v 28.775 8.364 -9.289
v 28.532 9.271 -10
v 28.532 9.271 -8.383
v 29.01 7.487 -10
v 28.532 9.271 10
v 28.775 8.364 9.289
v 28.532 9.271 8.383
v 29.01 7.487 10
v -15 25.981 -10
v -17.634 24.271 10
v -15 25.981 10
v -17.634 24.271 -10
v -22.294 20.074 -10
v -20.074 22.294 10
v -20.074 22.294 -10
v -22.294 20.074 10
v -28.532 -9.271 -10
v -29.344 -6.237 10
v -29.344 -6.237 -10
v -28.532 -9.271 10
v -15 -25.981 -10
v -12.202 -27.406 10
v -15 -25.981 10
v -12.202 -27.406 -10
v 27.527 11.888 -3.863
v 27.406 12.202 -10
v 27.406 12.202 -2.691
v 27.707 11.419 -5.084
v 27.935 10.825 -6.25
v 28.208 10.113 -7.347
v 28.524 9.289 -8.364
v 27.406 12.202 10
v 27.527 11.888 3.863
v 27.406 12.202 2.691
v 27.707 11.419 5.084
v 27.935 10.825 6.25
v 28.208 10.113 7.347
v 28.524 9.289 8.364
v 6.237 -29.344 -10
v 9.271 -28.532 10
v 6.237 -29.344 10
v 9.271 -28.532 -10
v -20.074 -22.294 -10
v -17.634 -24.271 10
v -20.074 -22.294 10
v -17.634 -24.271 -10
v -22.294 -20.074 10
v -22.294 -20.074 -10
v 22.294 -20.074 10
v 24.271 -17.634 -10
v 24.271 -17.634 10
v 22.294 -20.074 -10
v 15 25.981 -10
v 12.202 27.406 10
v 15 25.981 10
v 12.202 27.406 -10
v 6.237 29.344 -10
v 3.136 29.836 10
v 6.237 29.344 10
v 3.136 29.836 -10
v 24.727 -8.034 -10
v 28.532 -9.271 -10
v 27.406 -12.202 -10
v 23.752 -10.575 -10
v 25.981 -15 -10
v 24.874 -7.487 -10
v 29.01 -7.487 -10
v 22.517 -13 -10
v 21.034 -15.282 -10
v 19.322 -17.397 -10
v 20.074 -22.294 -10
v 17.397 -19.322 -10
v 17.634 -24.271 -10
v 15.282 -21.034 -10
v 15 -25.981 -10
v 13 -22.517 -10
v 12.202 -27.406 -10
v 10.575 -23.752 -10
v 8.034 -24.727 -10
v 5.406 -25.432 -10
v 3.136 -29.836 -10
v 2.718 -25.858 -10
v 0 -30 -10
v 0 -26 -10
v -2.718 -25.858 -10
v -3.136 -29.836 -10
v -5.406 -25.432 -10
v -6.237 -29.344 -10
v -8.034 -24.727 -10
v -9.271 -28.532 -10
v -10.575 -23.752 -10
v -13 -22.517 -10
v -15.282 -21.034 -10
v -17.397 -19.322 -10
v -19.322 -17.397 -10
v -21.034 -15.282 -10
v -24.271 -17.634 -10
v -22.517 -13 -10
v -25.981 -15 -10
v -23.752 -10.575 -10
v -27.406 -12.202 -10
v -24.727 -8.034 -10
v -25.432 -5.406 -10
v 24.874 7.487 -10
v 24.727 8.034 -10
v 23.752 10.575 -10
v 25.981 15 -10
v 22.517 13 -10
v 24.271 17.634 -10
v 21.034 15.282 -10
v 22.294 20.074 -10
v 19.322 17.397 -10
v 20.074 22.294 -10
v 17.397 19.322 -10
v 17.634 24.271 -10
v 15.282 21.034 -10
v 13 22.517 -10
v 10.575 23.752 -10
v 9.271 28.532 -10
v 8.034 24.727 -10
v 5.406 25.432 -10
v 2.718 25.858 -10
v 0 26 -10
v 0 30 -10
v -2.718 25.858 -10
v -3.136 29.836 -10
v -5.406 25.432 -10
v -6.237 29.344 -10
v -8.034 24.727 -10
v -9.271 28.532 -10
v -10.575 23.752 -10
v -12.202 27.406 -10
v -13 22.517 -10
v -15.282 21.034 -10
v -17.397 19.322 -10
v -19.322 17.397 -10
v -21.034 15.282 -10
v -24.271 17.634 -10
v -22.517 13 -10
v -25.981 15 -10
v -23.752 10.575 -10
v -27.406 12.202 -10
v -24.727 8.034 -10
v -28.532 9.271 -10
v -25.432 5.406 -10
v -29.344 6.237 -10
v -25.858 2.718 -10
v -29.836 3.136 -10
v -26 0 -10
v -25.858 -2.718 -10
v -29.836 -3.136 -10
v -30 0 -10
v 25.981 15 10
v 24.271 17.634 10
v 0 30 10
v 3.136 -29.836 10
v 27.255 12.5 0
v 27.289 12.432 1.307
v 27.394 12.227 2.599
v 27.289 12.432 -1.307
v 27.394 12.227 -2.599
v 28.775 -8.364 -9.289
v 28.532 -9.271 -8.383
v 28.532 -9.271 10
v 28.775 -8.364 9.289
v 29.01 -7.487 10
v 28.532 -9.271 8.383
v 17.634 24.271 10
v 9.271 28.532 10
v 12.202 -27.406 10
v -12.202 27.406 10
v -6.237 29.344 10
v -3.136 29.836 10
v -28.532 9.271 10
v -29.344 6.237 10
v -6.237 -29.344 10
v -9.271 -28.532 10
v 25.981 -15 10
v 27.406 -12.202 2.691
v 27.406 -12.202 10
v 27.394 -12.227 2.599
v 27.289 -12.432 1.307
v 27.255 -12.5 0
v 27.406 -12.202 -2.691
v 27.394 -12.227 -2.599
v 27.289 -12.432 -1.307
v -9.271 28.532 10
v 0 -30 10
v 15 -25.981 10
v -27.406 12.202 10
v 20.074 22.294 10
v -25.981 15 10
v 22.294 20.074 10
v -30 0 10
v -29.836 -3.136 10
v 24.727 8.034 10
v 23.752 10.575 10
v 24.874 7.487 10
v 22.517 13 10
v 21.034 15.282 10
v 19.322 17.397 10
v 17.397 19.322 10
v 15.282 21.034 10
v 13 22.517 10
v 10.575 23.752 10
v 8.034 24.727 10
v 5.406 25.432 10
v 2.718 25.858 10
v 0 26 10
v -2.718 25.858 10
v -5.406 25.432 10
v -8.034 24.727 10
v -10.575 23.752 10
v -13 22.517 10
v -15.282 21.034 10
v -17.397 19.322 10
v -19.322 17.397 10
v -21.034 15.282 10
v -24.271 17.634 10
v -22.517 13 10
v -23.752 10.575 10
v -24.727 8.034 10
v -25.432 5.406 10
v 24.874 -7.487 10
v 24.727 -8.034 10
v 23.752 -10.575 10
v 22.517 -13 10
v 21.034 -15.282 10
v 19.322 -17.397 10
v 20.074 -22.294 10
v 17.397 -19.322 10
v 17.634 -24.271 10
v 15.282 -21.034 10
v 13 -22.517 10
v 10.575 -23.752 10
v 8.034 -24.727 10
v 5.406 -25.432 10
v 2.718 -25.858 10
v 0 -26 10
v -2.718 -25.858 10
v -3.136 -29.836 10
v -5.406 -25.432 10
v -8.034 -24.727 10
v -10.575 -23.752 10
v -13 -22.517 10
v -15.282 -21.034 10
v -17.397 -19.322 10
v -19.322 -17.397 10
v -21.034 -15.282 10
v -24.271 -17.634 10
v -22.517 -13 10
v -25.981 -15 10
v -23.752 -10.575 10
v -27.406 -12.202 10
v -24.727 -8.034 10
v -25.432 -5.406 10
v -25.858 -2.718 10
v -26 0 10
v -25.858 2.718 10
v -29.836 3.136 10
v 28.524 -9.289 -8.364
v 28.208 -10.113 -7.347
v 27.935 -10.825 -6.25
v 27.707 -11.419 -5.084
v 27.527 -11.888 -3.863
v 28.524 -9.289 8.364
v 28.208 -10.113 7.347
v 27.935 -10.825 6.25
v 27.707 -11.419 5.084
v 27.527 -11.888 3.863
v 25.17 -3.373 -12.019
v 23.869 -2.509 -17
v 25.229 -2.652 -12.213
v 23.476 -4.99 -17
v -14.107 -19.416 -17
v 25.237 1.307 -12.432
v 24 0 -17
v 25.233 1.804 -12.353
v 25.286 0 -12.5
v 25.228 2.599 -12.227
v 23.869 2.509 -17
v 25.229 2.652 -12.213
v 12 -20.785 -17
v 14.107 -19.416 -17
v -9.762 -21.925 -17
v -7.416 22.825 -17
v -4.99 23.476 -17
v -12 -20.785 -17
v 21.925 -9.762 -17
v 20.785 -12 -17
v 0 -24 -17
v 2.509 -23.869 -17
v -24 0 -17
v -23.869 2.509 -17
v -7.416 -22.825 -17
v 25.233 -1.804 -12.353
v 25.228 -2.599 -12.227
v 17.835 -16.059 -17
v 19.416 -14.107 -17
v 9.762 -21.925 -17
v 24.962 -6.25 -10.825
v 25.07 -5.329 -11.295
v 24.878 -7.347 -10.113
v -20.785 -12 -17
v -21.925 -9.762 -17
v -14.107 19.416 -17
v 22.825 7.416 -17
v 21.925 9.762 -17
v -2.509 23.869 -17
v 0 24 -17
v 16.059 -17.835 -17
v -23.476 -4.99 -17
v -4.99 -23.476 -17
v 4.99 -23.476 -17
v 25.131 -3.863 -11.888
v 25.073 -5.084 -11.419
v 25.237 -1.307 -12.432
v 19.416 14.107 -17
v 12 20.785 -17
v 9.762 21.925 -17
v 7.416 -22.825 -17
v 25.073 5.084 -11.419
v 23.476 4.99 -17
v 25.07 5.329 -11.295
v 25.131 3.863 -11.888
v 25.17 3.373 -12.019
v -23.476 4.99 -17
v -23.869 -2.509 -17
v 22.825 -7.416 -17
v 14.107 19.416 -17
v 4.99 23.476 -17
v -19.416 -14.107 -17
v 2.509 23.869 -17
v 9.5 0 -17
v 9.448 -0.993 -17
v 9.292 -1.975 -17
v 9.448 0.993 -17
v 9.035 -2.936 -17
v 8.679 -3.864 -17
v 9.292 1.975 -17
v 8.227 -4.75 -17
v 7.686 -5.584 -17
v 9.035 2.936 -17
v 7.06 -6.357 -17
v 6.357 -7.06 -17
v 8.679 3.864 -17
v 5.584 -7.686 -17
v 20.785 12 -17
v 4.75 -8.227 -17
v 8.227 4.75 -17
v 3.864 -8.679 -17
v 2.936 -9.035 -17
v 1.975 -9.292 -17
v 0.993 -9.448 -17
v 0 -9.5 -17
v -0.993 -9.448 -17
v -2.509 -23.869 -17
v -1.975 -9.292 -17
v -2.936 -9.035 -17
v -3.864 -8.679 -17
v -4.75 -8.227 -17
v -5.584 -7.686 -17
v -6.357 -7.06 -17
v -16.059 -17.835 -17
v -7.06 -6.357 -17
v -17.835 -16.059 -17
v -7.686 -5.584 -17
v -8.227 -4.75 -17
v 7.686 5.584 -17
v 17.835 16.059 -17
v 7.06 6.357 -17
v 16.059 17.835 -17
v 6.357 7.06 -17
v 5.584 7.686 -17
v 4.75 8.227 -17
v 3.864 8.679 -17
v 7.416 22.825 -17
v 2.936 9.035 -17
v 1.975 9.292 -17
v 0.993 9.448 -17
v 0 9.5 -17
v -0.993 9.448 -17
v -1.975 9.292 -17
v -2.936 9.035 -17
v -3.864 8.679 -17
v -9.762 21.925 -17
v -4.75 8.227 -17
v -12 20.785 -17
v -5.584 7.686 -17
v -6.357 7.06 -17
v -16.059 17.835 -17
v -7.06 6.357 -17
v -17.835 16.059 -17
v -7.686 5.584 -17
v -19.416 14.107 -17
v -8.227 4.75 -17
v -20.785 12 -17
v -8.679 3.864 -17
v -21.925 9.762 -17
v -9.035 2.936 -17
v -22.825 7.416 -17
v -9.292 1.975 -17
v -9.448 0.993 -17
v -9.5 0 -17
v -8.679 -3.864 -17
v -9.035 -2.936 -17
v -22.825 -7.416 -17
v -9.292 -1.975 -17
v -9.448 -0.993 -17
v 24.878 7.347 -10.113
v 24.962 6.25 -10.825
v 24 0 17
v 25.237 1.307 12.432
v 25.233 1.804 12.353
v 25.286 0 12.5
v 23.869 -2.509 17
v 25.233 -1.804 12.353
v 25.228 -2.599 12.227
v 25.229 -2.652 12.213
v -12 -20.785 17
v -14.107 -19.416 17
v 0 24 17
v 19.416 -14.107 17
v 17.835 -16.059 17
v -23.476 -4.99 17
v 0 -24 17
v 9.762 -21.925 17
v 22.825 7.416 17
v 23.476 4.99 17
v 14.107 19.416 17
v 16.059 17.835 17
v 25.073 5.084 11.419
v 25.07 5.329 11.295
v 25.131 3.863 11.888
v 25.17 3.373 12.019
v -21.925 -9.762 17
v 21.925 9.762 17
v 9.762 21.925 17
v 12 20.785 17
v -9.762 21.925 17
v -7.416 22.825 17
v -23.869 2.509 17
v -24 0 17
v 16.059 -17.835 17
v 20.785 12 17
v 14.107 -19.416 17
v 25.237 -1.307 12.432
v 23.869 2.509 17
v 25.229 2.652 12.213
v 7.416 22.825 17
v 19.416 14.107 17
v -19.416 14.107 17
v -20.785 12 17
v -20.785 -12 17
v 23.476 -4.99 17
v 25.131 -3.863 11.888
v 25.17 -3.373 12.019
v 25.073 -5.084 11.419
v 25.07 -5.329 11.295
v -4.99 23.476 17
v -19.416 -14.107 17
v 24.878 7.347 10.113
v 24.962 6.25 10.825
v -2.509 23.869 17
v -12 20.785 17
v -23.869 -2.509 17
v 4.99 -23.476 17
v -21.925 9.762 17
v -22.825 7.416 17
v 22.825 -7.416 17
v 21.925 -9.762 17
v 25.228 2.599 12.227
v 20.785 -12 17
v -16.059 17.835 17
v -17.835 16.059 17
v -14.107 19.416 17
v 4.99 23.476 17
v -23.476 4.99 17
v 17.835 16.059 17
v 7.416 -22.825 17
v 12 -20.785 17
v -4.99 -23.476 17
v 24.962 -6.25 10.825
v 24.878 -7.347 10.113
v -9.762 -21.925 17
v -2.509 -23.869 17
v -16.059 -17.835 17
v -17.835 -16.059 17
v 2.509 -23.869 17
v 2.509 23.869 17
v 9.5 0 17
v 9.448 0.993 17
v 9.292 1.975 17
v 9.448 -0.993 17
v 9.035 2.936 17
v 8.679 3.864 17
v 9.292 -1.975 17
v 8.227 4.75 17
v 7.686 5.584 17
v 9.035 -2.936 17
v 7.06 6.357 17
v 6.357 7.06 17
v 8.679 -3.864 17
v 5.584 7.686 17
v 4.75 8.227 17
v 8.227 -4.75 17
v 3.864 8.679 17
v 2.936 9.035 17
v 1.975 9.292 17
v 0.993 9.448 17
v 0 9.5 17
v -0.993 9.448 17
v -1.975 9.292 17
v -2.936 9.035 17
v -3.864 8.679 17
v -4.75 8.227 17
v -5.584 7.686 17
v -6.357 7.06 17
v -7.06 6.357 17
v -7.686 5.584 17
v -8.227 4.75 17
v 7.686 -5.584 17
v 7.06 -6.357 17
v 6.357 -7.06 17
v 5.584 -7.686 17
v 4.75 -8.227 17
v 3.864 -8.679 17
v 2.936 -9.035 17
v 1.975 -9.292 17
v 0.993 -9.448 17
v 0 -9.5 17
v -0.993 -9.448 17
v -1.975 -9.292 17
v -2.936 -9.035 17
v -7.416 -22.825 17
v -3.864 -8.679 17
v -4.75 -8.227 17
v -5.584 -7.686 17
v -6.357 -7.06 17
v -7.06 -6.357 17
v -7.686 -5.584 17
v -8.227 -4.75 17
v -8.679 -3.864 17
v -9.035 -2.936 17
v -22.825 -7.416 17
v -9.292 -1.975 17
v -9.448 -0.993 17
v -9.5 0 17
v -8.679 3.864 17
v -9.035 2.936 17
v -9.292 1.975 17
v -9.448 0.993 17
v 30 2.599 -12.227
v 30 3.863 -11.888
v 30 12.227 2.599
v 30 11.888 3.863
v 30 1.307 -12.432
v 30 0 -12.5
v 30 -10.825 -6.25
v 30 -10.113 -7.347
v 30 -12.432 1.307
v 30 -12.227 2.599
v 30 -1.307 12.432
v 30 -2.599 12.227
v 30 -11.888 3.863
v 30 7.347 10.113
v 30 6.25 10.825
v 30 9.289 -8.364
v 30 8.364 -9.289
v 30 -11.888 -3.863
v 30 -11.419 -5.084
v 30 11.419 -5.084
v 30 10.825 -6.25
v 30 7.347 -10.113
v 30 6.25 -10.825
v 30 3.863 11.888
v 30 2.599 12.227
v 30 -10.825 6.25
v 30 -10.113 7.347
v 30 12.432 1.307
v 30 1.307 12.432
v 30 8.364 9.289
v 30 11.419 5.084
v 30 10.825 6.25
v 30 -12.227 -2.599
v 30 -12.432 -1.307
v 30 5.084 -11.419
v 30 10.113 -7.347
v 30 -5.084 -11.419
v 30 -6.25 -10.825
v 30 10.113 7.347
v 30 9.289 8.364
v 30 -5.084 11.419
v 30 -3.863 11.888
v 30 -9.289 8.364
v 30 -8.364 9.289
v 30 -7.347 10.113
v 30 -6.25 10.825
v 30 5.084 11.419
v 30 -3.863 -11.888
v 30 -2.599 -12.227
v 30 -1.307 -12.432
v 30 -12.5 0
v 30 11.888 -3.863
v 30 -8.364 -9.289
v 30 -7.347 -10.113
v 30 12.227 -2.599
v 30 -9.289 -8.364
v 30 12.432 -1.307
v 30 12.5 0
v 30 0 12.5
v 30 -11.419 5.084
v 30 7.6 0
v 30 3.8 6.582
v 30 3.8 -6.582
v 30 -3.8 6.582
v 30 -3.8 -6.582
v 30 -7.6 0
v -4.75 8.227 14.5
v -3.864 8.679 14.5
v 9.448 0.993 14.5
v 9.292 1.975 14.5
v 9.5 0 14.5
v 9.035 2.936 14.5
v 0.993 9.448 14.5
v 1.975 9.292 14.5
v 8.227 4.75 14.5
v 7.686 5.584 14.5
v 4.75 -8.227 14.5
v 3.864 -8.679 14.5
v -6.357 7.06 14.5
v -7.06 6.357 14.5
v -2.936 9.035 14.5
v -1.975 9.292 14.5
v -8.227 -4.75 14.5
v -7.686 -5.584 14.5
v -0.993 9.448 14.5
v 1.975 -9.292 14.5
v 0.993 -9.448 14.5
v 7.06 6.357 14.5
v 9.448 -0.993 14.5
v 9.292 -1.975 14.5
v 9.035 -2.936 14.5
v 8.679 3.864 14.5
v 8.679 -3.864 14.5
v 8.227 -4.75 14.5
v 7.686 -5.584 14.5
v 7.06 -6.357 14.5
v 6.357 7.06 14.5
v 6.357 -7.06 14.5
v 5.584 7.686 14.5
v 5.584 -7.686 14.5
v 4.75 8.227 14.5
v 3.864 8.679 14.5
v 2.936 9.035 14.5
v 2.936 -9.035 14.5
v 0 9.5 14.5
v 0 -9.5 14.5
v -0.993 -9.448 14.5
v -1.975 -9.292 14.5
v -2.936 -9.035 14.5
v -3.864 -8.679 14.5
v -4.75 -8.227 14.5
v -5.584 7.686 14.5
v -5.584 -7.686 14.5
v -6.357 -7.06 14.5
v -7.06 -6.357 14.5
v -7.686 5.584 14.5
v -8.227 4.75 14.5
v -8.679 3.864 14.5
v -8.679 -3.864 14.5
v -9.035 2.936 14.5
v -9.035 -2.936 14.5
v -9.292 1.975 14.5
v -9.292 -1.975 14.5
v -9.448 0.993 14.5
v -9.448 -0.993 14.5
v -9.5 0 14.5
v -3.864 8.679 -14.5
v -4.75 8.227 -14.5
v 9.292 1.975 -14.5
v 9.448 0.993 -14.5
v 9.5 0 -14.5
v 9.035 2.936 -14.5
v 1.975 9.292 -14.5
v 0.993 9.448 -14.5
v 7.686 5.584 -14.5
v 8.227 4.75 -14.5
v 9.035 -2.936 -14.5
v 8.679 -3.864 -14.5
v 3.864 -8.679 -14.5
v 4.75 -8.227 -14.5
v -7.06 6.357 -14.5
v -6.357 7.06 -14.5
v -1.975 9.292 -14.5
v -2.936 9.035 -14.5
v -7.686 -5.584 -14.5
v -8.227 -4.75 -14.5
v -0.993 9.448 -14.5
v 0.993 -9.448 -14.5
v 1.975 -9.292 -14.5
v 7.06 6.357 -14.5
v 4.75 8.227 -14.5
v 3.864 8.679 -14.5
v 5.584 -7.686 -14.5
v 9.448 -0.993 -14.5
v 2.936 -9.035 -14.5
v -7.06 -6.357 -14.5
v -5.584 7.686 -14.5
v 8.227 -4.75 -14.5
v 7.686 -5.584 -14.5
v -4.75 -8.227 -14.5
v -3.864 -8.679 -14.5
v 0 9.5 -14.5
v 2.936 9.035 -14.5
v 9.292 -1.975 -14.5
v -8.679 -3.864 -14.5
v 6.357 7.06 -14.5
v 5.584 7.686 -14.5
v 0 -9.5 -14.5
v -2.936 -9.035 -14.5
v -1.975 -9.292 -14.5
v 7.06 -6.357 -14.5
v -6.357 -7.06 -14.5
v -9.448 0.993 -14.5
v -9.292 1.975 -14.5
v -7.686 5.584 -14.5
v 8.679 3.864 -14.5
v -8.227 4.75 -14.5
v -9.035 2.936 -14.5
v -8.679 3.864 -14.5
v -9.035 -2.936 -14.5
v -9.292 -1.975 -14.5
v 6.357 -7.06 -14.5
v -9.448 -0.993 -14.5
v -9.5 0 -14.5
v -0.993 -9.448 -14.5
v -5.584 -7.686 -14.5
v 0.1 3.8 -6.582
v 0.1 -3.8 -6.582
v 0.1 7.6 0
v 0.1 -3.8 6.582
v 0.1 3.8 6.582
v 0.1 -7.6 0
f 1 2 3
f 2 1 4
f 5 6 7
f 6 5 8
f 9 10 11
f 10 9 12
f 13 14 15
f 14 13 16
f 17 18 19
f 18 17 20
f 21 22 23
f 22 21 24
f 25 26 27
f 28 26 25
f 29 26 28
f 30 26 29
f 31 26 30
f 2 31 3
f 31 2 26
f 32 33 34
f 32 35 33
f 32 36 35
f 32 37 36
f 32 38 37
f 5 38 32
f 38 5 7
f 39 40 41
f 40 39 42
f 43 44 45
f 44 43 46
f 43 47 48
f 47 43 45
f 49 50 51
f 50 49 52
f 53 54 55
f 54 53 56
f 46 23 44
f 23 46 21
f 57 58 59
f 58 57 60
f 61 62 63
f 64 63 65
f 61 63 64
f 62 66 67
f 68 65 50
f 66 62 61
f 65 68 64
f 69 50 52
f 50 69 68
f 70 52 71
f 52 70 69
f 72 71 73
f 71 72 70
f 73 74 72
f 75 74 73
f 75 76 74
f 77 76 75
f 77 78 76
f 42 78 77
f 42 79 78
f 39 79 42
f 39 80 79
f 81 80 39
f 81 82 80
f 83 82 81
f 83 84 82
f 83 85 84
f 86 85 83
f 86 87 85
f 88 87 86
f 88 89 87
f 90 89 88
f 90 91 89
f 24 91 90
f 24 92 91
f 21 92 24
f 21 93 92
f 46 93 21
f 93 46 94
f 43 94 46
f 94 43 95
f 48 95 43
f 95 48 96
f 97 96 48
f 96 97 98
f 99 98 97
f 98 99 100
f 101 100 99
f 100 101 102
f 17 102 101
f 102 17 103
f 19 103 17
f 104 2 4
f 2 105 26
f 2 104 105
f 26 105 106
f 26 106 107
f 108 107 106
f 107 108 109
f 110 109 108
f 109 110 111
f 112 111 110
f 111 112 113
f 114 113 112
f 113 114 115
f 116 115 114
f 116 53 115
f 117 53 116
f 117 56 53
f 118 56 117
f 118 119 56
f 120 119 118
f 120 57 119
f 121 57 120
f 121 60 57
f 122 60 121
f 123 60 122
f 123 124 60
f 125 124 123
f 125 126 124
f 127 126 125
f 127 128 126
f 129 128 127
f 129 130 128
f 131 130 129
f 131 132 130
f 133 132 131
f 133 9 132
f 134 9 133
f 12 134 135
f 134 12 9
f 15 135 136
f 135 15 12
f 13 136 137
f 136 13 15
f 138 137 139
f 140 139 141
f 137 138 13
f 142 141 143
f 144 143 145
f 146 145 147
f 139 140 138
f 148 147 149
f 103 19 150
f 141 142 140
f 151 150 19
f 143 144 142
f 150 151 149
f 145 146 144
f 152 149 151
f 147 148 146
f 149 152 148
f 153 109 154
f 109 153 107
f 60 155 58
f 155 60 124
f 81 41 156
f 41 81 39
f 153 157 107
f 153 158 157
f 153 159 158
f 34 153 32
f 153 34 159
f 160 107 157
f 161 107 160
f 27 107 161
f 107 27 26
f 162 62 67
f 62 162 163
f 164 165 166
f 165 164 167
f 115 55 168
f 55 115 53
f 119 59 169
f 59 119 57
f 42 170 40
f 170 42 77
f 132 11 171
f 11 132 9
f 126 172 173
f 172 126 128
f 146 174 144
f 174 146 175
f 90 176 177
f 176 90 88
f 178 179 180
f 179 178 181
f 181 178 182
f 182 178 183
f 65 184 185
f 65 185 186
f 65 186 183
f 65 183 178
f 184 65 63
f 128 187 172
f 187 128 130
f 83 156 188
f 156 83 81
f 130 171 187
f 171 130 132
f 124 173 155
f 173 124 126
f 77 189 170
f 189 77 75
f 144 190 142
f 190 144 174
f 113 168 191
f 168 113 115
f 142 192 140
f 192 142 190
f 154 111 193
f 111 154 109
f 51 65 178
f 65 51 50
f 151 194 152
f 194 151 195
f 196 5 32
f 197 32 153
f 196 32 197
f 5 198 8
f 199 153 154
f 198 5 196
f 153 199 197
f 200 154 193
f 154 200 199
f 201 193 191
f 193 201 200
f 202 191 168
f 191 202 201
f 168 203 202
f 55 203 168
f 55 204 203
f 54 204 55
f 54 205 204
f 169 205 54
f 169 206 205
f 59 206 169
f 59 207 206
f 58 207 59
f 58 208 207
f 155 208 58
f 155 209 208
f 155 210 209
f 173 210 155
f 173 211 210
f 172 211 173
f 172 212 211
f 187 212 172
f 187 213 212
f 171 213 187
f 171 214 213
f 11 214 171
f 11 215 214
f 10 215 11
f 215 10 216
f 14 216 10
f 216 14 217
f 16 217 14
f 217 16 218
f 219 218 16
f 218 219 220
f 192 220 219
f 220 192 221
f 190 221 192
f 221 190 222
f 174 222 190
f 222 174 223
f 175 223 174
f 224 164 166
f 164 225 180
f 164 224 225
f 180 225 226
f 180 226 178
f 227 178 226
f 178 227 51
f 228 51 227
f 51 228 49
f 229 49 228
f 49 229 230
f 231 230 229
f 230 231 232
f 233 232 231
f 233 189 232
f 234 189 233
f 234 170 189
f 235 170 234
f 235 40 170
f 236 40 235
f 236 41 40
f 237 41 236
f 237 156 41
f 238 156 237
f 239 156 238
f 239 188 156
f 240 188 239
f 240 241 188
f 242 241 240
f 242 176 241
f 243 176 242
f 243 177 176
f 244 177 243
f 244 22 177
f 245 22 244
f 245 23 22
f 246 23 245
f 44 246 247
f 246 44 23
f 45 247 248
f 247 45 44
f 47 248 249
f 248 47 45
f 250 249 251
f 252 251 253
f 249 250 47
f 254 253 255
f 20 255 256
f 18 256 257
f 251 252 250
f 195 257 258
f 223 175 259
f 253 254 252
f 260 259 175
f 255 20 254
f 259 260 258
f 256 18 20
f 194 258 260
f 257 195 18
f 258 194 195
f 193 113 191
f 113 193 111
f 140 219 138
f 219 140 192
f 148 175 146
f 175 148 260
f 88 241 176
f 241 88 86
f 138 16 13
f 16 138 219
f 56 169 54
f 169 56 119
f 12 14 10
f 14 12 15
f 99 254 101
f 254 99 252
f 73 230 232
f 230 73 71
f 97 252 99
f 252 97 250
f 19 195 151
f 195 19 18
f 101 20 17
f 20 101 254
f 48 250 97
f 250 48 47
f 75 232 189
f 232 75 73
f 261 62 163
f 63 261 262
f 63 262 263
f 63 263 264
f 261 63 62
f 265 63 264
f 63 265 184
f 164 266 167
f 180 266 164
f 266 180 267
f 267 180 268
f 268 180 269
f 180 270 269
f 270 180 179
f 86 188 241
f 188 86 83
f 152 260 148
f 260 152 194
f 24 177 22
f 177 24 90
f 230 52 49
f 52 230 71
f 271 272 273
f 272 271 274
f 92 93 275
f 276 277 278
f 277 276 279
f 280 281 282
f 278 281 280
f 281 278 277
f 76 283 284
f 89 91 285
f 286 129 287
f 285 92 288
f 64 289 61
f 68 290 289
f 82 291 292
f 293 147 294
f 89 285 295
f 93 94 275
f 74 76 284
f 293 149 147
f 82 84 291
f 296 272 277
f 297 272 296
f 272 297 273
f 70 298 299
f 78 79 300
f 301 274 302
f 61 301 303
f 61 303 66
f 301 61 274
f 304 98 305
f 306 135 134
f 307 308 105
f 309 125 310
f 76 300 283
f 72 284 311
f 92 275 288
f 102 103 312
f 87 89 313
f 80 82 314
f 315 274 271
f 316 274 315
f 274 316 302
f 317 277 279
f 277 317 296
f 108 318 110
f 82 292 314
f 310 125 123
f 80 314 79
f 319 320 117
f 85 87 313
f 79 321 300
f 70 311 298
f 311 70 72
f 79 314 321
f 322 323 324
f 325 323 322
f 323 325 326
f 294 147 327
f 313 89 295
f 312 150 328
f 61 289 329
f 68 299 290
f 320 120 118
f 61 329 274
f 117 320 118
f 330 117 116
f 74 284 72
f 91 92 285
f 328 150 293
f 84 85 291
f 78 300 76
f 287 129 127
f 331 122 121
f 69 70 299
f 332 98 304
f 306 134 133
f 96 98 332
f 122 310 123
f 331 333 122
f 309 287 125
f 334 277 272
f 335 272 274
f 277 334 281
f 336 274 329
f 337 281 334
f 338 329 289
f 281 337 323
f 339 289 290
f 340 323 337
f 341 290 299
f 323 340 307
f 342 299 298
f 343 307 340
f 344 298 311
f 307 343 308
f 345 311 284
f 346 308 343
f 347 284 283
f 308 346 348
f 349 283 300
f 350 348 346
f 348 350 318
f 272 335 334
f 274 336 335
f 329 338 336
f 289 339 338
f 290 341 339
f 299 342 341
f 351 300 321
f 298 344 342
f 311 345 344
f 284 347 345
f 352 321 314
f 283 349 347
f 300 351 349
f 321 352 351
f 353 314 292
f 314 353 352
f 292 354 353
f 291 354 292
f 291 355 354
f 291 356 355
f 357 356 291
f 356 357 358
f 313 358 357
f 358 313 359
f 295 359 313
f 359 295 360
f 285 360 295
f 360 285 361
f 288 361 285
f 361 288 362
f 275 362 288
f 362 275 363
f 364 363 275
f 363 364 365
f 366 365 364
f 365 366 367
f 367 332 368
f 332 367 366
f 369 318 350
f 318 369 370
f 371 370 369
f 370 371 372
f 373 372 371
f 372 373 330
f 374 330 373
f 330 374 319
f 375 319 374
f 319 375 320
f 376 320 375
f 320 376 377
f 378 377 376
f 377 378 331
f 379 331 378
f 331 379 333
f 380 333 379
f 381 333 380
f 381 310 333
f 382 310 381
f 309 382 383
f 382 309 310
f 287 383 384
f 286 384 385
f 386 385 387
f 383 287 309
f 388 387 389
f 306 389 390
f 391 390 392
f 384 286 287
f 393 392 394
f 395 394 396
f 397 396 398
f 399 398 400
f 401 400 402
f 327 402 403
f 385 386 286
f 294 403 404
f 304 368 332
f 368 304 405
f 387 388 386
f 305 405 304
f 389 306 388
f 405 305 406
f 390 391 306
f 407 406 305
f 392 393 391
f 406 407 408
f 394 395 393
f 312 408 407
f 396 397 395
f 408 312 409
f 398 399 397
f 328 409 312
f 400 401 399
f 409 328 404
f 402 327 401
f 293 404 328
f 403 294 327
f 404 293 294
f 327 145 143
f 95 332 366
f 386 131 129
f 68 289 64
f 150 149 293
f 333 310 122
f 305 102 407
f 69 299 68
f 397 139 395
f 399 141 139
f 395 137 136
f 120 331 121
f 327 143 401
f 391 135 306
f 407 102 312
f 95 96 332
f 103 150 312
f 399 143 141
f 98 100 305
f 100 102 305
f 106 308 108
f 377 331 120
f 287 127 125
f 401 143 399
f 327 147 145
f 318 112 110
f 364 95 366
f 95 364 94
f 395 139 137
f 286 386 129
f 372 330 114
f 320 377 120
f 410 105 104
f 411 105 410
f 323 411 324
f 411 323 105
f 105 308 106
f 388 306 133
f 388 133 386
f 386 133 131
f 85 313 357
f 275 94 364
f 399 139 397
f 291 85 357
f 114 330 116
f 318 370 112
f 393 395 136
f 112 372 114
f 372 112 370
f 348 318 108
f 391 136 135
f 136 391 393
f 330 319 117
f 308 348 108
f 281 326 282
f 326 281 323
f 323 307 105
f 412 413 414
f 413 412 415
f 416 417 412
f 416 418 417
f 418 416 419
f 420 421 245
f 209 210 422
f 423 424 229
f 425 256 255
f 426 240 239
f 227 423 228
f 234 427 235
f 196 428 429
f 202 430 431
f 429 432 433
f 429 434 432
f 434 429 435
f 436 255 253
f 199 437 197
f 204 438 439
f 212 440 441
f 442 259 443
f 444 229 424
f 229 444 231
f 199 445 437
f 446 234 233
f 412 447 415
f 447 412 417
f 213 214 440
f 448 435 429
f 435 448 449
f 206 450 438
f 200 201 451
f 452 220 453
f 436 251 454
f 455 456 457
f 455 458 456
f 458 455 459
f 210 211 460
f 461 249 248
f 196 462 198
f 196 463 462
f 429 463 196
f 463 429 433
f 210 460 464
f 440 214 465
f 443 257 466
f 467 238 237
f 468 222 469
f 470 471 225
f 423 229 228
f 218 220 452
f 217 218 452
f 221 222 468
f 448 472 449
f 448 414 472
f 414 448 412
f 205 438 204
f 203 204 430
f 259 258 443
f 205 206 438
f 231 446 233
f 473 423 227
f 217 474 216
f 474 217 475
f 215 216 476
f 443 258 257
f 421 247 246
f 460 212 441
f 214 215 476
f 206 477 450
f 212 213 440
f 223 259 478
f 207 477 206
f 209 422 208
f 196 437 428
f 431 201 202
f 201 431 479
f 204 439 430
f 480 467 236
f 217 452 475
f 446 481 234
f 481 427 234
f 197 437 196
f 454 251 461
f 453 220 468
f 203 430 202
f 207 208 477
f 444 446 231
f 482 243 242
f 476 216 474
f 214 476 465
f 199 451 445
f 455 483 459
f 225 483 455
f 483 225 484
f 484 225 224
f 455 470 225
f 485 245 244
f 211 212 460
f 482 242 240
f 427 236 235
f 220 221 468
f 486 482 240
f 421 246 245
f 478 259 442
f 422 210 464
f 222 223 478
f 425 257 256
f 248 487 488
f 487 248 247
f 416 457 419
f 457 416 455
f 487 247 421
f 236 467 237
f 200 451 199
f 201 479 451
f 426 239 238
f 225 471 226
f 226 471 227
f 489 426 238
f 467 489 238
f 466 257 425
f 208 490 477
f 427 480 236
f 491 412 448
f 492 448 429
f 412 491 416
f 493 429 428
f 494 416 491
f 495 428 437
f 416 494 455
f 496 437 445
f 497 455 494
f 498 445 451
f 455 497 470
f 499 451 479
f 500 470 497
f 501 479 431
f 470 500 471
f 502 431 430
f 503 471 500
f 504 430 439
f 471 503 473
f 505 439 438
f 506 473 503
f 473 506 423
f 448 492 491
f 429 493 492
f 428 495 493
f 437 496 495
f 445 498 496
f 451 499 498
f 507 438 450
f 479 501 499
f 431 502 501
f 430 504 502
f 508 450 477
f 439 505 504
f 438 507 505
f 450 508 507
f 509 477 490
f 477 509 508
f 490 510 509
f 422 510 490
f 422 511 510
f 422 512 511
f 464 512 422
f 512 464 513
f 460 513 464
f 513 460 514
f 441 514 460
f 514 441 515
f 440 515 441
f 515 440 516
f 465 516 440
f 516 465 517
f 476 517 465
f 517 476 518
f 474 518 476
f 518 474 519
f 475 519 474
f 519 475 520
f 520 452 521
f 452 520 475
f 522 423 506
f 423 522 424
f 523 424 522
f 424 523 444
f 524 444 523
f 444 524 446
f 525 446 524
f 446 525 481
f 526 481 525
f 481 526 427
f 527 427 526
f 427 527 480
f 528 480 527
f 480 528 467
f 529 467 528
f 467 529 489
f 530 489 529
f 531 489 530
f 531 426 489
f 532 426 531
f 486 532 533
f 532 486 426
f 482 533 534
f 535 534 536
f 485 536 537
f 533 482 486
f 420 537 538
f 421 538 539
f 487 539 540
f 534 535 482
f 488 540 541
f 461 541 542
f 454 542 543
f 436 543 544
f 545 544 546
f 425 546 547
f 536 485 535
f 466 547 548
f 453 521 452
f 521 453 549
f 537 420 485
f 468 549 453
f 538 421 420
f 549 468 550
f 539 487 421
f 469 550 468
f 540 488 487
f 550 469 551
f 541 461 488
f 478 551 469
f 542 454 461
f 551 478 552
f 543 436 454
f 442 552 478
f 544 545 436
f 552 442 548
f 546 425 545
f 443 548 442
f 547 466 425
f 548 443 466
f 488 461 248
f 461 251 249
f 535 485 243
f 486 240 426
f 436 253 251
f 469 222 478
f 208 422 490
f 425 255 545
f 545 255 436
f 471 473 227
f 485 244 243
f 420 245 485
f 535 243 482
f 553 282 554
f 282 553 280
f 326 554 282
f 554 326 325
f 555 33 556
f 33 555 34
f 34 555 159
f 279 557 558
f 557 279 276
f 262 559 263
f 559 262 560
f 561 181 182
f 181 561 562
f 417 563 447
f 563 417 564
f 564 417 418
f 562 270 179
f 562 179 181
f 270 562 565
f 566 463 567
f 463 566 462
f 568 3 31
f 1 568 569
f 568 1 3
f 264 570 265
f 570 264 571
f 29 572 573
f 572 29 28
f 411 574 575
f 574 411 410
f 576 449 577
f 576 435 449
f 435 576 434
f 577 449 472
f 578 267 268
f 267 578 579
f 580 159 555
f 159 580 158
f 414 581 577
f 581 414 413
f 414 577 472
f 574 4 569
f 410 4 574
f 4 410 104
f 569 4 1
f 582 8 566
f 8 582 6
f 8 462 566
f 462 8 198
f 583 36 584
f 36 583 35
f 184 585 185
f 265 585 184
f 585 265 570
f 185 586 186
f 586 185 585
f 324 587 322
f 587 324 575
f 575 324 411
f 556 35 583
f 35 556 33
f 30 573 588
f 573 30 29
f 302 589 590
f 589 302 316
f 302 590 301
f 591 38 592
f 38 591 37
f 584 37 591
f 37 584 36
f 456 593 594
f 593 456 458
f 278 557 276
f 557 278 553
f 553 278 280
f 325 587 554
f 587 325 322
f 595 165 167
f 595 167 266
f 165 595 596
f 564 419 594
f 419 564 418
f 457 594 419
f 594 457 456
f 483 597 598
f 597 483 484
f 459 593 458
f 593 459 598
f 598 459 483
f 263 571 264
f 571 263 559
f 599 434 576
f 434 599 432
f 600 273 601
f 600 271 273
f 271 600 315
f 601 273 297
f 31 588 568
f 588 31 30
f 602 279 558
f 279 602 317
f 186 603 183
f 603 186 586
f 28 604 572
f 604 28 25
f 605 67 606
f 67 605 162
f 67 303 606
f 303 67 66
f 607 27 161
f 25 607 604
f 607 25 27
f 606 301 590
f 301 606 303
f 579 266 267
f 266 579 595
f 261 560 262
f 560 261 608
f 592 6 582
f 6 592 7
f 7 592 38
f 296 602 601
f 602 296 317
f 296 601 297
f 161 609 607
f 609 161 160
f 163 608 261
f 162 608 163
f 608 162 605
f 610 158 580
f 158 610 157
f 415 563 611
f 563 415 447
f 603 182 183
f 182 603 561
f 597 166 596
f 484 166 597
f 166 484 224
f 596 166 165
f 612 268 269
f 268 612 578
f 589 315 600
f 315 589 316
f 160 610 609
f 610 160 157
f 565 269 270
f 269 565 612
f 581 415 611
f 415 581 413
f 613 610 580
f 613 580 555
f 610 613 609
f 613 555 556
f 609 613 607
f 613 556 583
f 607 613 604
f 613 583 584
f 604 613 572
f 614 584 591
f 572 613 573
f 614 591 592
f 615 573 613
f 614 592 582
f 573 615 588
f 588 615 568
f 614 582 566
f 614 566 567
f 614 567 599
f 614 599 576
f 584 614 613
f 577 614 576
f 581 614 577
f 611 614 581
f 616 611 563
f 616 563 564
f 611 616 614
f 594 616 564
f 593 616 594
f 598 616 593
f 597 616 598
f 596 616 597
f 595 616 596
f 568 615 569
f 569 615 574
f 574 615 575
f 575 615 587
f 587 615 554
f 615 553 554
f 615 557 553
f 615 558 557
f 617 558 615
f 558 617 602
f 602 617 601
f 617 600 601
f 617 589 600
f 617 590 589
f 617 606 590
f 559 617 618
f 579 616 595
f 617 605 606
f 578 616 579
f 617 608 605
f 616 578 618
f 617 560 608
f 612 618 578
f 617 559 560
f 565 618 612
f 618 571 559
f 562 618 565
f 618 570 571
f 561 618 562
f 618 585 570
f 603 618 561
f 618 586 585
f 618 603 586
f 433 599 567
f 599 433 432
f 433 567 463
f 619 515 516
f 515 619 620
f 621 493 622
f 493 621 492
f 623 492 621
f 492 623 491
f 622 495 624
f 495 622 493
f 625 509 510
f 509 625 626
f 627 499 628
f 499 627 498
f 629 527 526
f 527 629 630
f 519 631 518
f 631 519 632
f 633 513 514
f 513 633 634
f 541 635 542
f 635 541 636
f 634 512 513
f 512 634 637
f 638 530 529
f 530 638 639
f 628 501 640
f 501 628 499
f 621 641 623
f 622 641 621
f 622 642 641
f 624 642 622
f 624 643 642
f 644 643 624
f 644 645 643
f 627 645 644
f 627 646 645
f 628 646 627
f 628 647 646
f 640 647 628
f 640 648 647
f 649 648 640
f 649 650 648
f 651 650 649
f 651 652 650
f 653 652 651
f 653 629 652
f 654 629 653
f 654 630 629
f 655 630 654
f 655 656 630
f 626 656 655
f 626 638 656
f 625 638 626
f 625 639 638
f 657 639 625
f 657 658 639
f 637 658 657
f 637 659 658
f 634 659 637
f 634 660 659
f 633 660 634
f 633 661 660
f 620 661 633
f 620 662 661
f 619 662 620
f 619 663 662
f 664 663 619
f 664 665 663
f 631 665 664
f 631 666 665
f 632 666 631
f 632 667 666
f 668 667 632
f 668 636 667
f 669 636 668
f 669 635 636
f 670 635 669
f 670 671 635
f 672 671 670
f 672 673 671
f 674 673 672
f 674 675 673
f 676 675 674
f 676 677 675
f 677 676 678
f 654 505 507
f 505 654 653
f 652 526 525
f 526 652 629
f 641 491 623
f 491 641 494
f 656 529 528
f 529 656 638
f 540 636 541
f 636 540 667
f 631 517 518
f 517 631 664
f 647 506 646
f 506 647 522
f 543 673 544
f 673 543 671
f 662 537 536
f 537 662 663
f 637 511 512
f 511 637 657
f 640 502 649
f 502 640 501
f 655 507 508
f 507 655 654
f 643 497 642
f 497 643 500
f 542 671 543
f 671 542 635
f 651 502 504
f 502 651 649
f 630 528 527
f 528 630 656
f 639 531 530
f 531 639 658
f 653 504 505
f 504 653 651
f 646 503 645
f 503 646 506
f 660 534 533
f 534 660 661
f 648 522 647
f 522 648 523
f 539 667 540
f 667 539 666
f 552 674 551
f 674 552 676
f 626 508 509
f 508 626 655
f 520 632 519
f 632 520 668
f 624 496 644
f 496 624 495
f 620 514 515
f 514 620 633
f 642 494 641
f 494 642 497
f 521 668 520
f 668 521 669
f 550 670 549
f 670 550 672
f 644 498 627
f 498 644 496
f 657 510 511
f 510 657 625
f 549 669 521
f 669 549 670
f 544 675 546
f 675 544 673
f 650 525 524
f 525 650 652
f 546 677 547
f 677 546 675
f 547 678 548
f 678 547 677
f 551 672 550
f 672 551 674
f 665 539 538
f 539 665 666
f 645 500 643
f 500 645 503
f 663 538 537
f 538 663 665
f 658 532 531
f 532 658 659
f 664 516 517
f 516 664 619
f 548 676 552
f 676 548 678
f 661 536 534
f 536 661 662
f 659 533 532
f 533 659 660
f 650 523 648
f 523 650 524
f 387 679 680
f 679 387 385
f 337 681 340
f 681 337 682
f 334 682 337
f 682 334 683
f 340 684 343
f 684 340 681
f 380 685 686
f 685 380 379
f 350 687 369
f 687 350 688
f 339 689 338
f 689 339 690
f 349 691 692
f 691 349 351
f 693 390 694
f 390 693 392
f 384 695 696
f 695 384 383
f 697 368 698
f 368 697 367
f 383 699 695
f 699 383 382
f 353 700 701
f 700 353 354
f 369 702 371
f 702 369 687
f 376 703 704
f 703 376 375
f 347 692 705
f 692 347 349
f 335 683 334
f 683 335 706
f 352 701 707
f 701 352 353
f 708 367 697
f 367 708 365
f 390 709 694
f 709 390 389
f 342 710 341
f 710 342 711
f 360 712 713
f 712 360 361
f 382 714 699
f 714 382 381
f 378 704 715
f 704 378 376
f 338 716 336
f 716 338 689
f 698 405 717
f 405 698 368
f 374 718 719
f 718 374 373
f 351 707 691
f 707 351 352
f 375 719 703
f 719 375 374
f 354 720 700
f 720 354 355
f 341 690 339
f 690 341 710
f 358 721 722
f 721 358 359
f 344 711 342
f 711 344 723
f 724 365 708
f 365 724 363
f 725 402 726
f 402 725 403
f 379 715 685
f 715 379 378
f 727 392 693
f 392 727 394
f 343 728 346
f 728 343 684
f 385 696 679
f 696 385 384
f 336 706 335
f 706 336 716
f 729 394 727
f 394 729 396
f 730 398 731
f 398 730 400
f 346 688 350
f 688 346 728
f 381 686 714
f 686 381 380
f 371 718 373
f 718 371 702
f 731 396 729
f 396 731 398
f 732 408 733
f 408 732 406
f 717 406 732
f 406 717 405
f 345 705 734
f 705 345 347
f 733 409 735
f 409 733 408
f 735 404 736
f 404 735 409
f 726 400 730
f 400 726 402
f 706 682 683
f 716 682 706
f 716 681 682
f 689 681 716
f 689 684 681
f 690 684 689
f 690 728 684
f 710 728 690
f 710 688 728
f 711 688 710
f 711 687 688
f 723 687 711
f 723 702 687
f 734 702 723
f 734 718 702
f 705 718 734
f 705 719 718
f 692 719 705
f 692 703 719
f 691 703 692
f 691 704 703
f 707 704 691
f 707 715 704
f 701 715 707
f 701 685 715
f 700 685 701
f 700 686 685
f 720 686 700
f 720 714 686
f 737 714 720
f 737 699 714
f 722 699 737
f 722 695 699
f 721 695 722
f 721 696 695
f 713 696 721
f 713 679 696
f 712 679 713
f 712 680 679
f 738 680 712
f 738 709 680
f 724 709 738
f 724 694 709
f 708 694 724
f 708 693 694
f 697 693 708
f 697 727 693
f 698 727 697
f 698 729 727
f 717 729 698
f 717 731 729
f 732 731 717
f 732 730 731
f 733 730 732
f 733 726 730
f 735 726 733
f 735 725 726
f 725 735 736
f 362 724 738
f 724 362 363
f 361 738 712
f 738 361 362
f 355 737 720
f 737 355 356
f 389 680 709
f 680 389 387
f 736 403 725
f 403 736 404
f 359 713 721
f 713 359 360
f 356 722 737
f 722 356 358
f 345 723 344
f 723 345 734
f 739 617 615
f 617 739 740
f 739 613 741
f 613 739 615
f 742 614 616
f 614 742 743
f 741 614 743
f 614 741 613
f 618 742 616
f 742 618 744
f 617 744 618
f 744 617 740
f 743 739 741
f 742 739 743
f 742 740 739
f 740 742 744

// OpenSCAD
tolerance = 0.1;
captive_nut = 1; //Set to something else if you'd rather screw directly into plastic
$fn = 60;

difference() {

	union() {
		//Main wheel and tapered faces
		cylinder(r=30, h=20, center=true);
		translate([0,0,-20/2-7/2]) cylinder(r1=24, r2=26, h=7, center=true);
		translate([0,0,20/2+7/2]) cylinder(r1=26, r2=24, h=7, center=true);
		//This should probably just be mirriored, but I'm too lazy.

		//The base
		translate([15,0,0]) rotate([0,90,0]) cylinder(r=25/2, h=30, center=true);
	}

	union(){
		translate([0,0,19/2+7]) cylinder(r=19/2, h=4, center=true);
		translate([0,0,-19/2-7]) cylinder(r=19/2, h=4, center=true);

		if(captive_nut==1){
			rotate([90,0,0]) translate([tolerance, 0, 0]) rotate([0,90,0]) cylinder(r=15/2+tolerance, h=32+tolerance, $fn=6);
		} else {
			translate([-tolerance, 0, 0]) rotate([0,90,0]) cylinder(r=7/2+tolerance,h=32+tolerance);
		}
	}
}
